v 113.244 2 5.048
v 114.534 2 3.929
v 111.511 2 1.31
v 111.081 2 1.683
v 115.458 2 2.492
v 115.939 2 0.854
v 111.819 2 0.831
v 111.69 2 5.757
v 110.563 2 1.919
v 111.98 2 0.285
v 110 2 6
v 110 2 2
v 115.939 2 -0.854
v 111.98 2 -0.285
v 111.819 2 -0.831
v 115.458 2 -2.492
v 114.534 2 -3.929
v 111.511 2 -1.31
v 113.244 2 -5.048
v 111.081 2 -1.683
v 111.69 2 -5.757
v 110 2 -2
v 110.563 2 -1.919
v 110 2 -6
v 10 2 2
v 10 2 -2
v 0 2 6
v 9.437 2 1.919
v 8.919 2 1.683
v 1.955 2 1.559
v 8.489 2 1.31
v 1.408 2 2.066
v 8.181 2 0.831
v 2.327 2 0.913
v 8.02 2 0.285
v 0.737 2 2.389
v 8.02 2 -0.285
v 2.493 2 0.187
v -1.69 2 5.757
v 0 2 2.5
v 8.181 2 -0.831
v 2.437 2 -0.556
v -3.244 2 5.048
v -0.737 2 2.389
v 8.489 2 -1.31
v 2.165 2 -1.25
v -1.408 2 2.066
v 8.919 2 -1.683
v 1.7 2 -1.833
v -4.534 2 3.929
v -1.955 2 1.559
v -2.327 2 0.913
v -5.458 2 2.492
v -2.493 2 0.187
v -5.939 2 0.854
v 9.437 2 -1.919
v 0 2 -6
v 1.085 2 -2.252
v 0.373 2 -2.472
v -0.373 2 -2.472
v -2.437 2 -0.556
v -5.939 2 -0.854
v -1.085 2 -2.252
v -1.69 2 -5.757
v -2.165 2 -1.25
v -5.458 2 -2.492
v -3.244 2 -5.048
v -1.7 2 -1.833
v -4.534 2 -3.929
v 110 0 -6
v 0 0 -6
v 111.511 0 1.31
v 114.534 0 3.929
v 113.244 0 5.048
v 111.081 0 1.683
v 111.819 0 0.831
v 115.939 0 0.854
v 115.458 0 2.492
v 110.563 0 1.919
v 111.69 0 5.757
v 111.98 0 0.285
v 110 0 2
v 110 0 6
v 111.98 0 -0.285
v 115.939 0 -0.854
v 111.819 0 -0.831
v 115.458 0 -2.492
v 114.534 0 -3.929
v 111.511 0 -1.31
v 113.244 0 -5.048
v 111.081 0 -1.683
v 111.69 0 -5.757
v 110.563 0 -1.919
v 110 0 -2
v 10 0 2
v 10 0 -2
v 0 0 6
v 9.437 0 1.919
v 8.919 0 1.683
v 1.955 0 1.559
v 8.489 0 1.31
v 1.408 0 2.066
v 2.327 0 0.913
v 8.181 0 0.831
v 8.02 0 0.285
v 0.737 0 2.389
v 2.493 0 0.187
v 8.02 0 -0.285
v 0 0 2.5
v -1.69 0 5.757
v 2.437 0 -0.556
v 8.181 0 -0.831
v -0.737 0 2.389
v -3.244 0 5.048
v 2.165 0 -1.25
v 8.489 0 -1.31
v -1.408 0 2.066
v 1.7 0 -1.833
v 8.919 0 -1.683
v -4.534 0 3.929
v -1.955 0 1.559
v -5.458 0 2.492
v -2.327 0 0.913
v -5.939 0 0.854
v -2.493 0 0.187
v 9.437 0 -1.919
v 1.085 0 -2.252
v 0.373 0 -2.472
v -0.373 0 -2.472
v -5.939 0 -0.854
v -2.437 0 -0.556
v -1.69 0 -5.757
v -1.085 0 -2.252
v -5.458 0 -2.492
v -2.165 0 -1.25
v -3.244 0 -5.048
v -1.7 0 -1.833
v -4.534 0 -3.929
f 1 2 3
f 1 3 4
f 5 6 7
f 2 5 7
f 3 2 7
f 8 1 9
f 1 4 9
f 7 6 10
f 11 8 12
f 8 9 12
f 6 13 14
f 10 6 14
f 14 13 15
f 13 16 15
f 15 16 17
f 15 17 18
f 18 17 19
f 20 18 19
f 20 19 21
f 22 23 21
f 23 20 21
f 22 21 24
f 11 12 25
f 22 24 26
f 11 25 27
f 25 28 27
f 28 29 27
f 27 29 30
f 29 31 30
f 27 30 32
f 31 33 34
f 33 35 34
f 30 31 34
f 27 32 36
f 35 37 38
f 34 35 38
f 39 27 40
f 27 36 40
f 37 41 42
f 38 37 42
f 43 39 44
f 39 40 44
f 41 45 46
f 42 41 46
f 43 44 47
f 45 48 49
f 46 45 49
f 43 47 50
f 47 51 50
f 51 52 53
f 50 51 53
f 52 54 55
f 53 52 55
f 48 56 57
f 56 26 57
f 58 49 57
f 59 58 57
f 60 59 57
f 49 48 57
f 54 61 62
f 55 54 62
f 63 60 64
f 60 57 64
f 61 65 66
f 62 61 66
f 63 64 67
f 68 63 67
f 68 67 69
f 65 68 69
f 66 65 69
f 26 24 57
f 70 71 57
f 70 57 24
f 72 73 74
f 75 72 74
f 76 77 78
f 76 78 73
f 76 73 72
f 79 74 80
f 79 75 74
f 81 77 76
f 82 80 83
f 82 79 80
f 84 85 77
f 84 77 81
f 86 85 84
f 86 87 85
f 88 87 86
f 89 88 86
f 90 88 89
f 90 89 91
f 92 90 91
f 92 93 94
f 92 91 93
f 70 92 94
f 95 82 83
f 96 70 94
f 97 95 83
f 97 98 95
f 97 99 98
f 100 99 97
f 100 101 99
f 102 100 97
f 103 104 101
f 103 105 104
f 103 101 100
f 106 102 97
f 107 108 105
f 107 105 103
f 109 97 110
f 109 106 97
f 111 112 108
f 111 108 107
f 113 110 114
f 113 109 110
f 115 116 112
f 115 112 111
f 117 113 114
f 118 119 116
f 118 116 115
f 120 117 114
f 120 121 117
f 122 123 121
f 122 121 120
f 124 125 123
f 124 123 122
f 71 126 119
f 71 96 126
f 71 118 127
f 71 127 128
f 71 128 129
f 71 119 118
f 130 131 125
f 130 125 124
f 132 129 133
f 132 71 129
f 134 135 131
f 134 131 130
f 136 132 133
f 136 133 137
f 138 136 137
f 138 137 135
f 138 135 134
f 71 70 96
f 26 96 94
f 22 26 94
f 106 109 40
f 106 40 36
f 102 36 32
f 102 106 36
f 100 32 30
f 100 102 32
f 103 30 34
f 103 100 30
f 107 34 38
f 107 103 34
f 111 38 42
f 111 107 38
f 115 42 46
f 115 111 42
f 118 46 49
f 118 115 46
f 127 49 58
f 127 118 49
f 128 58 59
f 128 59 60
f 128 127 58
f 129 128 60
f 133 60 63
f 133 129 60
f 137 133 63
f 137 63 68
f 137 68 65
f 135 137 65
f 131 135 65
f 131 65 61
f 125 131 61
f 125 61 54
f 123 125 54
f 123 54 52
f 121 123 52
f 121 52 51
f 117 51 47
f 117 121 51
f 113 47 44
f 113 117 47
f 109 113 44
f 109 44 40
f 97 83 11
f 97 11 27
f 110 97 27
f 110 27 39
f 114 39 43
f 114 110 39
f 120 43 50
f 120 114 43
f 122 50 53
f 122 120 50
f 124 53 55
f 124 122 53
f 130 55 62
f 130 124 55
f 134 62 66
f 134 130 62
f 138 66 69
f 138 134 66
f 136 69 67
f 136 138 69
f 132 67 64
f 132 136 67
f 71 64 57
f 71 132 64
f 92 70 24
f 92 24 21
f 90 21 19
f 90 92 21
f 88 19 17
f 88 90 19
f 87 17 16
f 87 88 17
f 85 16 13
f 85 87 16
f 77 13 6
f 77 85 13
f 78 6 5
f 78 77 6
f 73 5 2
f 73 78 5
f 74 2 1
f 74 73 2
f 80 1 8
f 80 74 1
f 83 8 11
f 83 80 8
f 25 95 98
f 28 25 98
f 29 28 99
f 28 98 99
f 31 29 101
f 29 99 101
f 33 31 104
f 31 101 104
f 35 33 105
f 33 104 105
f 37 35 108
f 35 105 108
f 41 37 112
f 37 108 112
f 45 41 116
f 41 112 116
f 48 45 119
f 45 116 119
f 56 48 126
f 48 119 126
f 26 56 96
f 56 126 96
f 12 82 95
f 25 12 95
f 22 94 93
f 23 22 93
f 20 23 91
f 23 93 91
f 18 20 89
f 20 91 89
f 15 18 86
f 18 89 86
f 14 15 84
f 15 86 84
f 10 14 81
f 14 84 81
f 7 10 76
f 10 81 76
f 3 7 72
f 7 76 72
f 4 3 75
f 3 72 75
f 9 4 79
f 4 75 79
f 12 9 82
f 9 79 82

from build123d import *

# Parameters (mm, degrees)
SKETCH1_R           = 2.5
BOSS_EXTRUDE1_DEPTH = 2


with BuildPart() as part:
    # Sketch1 → Boss-Extrude1 (new body)
    with BuildSketch(Plane(origin=(0, 0, 0), x_dir=(1, 0, 0), z_dir=(0, 1, 0))):
        with BuildLine():
            Line((0, 6), (110, 6))
            ThreePointArc((110, 6), (116, 0), (110, -6))
            Line((110, -6), (0, -6))
            ThreePointArc((0, -6), (-6, 0), (0, 6))
        make_face()
        with Locations(Location((0, 0, 0), (0, 0, 270))):
            Circle(SKETCH1_R, mode=Mode.SUBTRACT)
        with BuildLine():
            Line((10, 2), (110, 2))
            ThreePointArc((110, 2), (112, 0), (110, -2))
            Line((110, -2), (10, -2))
            ThreePointArc((10, -2), (8, 0), (10, 2))
        make_face(mode=Mode.SUBTRACT)
    extrude(amount=BOSS_EXTRUDE1_DEPTH)


solid = part.part
